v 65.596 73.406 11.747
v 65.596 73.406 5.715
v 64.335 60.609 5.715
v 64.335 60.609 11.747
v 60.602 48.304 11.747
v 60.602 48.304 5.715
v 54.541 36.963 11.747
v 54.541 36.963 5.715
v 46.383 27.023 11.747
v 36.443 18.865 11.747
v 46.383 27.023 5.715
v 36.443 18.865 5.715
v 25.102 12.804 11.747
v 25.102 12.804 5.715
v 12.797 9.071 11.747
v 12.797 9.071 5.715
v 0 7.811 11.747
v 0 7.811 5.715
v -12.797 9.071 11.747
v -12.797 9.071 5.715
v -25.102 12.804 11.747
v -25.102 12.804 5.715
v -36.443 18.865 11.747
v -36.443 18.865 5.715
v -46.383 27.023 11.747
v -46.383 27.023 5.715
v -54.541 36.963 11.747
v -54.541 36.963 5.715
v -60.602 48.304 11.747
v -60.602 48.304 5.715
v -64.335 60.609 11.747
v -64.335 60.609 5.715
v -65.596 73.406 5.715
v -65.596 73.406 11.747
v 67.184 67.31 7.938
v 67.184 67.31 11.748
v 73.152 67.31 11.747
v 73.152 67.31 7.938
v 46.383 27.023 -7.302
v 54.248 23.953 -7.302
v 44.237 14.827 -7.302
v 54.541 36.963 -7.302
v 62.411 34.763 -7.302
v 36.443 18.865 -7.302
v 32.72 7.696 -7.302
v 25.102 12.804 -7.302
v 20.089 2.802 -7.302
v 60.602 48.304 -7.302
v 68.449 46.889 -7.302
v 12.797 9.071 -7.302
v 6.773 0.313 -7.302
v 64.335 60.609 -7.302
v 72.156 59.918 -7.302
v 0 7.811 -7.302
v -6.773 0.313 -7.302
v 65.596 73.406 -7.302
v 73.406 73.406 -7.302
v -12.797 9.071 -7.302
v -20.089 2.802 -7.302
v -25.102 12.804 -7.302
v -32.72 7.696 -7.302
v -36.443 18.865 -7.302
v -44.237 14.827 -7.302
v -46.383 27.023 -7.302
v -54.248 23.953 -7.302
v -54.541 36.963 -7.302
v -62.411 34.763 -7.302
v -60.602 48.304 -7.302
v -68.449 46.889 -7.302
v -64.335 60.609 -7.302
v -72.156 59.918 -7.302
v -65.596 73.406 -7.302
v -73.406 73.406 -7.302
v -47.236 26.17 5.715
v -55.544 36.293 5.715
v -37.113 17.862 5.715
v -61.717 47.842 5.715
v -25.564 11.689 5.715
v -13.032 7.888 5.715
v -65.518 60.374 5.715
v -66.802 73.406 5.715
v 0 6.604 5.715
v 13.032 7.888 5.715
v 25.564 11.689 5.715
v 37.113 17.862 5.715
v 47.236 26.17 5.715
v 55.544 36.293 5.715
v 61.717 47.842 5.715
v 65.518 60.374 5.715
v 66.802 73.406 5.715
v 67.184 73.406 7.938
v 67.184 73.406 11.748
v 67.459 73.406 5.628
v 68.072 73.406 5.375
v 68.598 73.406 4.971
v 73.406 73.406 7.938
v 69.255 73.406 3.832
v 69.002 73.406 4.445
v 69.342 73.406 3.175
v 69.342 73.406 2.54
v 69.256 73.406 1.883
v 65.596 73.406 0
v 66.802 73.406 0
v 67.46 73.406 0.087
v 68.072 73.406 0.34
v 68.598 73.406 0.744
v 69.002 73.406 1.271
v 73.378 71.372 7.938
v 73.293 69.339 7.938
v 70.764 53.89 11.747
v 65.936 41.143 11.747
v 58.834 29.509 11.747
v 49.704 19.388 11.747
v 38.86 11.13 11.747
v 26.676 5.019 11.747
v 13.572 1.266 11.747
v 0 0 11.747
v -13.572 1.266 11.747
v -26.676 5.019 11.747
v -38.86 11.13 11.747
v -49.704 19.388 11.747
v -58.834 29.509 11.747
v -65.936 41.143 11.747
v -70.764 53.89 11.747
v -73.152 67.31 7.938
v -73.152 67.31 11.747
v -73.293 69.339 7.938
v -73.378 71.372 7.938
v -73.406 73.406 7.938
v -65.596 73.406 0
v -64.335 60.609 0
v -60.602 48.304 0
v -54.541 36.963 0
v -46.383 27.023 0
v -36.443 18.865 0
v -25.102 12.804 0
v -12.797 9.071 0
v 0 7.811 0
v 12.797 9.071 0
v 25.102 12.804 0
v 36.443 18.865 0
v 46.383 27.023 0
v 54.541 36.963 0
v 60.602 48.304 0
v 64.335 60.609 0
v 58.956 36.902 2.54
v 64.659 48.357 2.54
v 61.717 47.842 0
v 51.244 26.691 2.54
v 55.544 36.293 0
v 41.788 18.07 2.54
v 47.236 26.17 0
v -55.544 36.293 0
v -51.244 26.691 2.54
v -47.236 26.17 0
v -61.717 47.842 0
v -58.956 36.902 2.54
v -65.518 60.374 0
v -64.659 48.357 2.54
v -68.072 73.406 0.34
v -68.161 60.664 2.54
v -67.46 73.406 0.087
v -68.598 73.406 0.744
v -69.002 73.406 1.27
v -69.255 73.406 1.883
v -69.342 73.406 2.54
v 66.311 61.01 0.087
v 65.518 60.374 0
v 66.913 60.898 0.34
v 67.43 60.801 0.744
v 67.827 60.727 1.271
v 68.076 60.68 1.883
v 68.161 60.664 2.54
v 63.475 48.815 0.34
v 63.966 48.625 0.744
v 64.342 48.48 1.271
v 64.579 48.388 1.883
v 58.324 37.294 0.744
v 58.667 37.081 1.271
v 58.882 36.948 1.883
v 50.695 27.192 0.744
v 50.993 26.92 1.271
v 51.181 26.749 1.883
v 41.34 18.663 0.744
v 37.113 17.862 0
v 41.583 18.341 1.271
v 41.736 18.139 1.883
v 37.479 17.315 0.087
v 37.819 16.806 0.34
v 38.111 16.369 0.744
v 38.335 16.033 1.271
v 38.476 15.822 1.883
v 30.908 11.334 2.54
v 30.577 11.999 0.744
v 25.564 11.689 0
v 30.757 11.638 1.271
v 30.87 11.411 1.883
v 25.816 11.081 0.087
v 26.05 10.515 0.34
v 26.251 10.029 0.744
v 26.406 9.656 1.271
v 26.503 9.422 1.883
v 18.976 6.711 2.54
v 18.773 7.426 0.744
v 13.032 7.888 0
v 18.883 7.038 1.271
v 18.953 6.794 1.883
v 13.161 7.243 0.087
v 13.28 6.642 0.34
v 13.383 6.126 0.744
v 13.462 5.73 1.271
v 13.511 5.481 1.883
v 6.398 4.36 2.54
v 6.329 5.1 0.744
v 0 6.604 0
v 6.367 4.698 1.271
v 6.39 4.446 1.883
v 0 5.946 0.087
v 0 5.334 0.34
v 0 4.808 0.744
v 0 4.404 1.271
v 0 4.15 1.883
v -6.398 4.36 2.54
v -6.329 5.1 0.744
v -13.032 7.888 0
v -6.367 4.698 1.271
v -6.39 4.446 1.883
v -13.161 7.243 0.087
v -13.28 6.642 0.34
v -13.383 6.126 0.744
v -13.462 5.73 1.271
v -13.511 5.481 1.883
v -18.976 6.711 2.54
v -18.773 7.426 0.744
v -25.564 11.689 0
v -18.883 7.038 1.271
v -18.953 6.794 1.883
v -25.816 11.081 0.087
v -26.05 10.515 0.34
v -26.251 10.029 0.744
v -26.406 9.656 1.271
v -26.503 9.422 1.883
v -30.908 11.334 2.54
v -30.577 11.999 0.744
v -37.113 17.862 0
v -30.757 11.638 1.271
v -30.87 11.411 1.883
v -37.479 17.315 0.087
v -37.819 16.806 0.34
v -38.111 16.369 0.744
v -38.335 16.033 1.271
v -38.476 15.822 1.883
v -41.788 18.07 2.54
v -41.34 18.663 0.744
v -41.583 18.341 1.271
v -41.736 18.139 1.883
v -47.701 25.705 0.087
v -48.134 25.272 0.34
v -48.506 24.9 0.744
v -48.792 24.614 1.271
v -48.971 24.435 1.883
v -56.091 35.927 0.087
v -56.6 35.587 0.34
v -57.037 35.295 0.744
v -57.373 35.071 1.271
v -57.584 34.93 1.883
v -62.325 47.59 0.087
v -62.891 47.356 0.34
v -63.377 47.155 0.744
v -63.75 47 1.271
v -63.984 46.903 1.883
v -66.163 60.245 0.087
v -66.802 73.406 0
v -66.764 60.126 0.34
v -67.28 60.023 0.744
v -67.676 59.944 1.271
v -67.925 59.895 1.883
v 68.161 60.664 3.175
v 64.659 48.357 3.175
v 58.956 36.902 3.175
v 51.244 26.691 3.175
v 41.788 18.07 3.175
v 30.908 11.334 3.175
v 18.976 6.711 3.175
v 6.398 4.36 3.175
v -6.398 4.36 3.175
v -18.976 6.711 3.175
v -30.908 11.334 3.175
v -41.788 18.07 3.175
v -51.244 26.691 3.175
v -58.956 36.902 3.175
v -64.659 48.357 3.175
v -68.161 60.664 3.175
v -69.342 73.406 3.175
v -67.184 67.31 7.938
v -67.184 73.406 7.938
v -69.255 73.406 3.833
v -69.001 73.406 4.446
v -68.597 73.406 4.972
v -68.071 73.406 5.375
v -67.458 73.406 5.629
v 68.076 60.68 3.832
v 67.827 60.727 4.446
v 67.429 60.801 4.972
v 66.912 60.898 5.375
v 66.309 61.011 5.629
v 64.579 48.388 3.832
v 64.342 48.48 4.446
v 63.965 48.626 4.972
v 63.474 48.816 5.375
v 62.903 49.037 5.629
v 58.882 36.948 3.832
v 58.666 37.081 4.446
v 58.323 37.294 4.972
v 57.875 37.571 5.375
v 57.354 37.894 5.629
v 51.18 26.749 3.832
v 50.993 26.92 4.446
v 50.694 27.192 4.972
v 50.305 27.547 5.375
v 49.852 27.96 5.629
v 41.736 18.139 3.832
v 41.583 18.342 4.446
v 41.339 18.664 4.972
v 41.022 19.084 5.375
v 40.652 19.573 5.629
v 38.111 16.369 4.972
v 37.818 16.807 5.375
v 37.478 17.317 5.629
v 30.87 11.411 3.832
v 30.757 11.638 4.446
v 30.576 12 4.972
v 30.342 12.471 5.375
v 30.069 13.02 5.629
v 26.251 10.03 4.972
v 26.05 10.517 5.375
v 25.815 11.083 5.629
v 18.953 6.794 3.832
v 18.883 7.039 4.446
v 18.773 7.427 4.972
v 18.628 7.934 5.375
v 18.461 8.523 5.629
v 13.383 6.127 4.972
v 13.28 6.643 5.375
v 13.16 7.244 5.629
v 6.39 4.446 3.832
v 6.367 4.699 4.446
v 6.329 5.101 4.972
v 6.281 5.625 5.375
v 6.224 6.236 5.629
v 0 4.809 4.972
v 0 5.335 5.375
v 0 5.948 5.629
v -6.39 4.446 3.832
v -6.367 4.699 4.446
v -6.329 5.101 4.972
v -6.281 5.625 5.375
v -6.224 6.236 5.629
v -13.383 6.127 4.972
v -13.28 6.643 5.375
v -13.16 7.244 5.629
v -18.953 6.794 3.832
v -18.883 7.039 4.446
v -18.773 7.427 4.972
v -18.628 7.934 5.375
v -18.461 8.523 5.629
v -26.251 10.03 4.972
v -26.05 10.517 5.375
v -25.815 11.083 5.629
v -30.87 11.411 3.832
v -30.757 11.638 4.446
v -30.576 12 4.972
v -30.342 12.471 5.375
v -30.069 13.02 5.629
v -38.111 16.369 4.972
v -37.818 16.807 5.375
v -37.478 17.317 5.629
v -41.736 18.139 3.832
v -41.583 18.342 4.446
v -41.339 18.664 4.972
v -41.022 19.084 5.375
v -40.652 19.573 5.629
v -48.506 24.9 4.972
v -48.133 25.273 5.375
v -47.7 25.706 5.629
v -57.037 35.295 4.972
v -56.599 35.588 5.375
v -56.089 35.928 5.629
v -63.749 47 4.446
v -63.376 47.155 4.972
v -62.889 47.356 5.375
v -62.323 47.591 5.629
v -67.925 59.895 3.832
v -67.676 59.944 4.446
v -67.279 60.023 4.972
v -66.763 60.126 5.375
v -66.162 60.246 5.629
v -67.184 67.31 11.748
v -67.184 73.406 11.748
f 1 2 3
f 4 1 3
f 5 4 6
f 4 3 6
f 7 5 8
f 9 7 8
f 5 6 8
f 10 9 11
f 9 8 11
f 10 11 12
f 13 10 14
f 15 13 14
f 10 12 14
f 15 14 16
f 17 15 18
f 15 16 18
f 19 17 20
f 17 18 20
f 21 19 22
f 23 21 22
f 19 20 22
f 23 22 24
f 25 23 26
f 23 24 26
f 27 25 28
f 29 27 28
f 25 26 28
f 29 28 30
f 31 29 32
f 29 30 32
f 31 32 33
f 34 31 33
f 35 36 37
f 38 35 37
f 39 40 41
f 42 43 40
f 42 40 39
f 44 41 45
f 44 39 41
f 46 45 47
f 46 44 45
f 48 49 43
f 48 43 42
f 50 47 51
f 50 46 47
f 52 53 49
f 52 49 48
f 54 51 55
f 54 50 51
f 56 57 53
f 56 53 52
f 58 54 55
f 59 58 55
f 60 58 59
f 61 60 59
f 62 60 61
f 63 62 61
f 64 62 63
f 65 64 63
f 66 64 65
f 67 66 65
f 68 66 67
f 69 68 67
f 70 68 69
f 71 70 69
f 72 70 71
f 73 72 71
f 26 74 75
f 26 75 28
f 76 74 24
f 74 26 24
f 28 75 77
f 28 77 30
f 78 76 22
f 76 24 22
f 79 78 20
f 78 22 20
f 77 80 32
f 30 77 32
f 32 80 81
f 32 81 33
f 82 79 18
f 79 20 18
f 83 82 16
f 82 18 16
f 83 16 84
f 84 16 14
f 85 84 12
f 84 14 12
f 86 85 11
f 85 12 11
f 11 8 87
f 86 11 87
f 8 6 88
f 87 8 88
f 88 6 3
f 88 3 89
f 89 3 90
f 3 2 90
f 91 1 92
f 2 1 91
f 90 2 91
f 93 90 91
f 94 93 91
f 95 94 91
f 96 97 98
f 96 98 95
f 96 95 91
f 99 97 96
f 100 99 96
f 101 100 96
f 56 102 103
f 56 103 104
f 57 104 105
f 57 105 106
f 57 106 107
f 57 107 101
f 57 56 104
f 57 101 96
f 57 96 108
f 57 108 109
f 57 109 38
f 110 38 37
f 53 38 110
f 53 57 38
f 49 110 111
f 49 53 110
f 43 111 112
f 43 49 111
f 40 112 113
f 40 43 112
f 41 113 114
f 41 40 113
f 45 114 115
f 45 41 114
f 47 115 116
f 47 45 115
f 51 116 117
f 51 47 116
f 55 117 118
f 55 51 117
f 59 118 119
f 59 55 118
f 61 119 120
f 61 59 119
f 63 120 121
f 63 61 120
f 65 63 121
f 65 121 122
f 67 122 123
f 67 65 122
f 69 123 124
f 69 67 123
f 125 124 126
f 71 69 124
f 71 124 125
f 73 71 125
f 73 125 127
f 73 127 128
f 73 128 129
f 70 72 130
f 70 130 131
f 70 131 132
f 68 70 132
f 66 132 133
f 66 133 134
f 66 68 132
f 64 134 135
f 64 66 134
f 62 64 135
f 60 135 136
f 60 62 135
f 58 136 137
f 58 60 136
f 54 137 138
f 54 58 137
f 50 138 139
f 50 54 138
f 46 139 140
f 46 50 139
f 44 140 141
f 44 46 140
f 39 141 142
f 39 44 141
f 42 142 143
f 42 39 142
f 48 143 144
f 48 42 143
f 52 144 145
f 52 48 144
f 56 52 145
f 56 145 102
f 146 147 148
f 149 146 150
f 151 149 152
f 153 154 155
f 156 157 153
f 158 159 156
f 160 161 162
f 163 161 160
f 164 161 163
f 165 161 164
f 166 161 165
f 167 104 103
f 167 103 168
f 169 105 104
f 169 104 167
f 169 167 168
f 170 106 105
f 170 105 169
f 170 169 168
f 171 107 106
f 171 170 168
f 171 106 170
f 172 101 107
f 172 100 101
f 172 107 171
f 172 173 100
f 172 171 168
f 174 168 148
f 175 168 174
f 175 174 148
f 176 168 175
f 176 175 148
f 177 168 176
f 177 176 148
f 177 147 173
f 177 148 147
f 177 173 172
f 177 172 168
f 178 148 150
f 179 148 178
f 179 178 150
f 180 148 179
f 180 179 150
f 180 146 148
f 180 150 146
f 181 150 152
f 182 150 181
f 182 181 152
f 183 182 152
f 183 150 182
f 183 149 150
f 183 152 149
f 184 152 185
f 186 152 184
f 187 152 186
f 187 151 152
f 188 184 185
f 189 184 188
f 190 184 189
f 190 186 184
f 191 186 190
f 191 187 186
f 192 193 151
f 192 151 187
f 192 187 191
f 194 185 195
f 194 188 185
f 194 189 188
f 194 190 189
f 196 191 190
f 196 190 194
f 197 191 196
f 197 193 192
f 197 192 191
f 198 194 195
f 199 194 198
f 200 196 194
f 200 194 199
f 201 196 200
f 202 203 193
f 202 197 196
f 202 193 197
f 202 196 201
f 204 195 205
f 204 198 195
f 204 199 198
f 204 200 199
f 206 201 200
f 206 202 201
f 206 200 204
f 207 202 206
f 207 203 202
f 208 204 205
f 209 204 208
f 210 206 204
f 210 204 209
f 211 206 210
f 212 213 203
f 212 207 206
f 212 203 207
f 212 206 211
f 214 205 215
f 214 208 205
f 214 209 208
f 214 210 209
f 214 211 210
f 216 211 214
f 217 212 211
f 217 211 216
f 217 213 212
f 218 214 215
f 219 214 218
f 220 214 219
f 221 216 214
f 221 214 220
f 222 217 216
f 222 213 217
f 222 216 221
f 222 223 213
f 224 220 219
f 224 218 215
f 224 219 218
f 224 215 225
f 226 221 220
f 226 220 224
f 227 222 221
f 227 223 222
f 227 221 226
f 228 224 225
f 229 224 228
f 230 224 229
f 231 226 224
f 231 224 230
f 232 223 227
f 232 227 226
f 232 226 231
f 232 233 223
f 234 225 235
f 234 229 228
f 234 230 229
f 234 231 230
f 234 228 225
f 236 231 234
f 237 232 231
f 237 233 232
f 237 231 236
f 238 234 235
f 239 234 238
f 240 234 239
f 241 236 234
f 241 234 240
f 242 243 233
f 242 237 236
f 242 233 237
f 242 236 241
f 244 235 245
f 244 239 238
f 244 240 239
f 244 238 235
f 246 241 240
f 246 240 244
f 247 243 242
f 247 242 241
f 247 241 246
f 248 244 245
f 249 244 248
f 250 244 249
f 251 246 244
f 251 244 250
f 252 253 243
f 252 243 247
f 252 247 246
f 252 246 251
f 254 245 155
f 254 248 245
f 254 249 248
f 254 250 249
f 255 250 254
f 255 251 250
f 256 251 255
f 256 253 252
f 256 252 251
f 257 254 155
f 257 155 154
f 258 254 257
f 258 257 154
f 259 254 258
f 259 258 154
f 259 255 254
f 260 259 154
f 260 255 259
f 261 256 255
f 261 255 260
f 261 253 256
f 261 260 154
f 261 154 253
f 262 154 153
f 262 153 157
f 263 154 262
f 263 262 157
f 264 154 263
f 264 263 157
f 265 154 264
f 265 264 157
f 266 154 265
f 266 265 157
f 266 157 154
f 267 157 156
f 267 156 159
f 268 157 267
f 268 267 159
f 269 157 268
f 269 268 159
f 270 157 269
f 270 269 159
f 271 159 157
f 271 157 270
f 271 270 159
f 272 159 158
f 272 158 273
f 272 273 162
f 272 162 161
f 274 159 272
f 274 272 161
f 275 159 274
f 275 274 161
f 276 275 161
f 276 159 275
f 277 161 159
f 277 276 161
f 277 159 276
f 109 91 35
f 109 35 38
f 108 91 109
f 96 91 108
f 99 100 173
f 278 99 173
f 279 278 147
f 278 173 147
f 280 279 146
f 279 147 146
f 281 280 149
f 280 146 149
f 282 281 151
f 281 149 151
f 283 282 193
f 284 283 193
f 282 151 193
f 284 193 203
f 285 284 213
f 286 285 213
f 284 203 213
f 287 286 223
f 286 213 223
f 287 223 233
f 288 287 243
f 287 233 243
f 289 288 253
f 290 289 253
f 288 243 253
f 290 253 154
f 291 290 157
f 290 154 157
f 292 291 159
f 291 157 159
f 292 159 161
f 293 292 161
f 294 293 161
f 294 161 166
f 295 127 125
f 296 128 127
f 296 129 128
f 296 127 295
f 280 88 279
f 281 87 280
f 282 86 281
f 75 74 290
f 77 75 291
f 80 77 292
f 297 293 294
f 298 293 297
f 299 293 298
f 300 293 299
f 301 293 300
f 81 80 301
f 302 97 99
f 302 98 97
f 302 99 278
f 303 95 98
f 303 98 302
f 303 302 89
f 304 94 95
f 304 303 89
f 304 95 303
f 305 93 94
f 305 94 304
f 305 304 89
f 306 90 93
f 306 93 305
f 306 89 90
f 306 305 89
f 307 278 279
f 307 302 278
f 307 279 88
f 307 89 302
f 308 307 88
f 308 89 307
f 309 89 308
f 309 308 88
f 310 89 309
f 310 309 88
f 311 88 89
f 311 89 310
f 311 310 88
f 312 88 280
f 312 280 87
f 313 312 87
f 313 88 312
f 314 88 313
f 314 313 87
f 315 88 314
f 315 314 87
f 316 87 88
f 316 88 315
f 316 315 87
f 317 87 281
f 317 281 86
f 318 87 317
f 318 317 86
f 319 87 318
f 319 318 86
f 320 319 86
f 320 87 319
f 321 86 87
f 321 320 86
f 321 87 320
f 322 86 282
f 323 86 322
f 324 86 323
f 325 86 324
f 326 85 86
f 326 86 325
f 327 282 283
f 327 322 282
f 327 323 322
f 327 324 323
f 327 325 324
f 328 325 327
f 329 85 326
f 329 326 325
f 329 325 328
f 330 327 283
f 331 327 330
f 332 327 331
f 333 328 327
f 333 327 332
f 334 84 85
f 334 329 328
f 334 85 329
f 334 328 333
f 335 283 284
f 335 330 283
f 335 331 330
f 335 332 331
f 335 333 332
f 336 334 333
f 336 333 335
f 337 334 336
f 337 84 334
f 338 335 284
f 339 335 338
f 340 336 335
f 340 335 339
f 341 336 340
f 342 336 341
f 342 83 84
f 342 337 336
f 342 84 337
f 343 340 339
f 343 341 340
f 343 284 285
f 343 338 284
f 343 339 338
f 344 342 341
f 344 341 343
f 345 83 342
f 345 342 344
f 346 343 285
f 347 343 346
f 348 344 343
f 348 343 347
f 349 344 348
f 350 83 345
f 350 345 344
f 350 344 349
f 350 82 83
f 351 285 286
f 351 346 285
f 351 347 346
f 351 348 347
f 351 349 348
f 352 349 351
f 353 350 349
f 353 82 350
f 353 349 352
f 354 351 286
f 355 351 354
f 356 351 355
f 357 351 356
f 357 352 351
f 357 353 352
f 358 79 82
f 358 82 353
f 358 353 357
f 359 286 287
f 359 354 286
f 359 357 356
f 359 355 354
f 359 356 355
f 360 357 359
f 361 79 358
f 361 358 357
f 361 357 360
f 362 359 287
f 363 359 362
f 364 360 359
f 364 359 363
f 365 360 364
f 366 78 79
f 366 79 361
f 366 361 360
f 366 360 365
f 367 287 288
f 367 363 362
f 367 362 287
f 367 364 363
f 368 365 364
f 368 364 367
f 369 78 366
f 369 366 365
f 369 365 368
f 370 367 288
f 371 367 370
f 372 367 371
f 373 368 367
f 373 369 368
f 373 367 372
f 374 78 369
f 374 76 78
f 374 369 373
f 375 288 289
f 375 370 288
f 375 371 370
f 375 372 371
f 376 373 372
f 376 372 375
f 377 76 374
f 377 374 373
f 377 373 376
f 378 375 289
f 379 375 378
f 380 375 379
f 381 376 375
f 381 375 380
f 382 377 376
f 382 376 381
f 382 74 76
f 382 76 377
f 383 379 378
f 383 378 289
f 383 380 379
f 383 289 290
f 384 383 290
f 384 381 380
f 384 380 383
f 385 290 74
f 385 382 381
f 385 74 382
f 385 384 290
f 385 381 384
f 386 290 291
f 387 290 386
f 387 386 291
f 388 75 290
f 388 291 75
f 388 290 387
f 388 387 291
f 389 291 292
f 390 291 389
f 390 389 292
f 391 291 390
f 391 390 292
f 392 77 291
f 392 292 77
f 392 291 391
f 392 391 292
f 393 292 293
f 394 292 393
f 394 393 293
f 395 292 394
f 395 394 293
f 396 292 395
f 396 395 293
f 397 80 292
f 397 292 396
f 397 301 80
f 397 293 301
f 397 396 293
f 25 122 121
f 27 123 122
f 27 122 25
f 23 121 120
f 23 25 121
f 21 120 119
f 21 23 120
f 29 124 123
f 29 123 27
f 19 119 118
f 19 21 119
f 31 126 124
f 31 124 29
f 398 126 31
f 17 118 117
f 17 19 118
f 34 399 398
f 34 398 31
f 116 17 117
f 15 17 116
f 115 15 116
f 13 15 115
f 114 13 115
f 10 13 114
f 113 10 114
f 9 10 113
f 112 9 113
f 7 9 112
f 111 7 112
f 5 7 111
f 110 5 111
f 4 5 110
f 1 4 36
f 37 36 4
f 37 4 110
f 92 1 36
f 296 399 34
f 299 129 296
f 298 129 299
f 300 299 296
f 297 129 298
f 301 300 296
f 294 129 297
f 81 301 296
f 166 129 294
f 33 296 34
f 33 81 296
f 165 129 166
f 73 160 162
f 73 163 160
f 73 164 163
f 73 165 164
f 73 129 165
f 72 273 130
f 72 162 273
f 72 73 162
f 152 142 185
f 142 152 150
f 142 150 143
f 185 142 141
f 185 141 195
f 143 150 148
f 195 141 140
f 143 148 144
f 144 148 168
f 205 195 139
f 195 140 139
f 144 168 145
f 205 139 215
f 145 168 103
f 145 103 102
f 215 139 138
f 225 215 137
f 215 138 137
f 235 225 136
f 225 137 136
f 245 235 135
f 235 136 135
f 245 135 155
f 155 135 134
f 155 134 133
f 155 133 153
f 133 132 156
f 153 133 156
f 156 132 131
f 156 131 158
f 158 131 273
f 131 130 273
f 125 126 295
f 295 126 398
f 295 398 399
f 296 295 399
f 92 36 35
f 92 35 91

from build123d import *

# Parameters (mm, degrees)
BOSS_EXTRUDE1_DEPTH = 5.715
BOSS_EXTRUDE2_DEPTH = 6.0325
BOSS_EXTRUDE3_START = 7.3025
BOSS_EXTRUDE3_DEPTH = 7.3025
FILLET1_R           = 2.54
SKETCH6_W           = 6.645493415
SKETCH6_H           = 6.096
CUT_EXTRUDE5_DEPTH  = 3.81


with BuildPart() as part:
    # Sketch1 → Boss-Extrude1 (new body)
    with BuildSketch(Plane.XY):
        with BuildLine():
            ThreePointArc((69.342, 73.406), (0, 4.064), (-69.342, 73.406))
            Line((-69.342, 73.406), (-73.406, 73.406))
            ThreePointArc((-73.406, 73.406), (0, 0), (73.406, 73.406))
            Line((73.406, 73.406), (69.342, 73.406))
        make_face()
    extrude(amount=BOSS_EXTRUDE1_DEPTH)

    # Sketch3 → Boss-Extrude2 (add)
    with BuildSketch(Plane.XY.offset(5.715)):
        with BuildLine():
            ThreePointArc((65.5955, 73.406), (0, 7.8105), (-65.5955, 73.406))
            Line((-65.5955, 73.406), (-69.342, 73.406))
            ThreePointArc((-69.342, 73.406), (0, 4.064), (69.342, 73.406))
            Line((69.342, 73.406), (65.5955, 73.406))
        make_face()
        with BuildLine():
            Line((73.406, 73.406), (69.342, 73.406))
            ThreePointArc((69.342, 73.406), (0, 4.064), (-69.342, 73.406))
            Line((-69.342, 73.406), (-73.406, 73.406))
            ThreePointArc((-73.406, 73.406), (0, 0), (73.406, 73.406))
        make_face()
    extrude(amount=BOSS_EXTRUDE2_DEPTH)

    # Sketch4 → Boss-Extrude3 (add)
    with BuildSketch(Plane(origin=(0, 0, 0), x_dir=(-1, 0, 0), z_dir=(0, 0, -1)).offset(BOSS_EXTRUDE3_START)):
        with BuildLine():
            ThreePointArc((65.5955, 73.406), (0, 7.8105), (-65.5955, 73.406))
            Line((-65.5955, 73.406), (-69.342, 73.406))
            ThreePointArc((-69.342, 73.406), (0, 4.064), (69.342, 73.406))
            Line((69.342, 73.406), (65.5955, 73.406))
        make_face()
        with BuildLine():
            Line((73.406, 73.406), (69.342, 73.406))
            ThreePointArc((69.342, 73.406), (0, 4.064), (-69.342, 73.406))
            Line((-69.342, 73.406), (-73.406, 73.406))
            ThreePointArc((-73.406, 73.406), (0, 0), (73.406, 73.406))
        make_face()
    extrude(amount=-BOSS_EXTRUDE3_DEPTH)

    # Fillet1
    fillet1_edges = [part.edges().sort_by_distance(p)[0] for p in [
        (0, 4.064, 5.715),
        (0, 4.064, 0),
    ]]
    fillet(fillet1_edges, radius=FILLET1_R)

    # Sketch6 → Cut-Extrude5 (cut)
    with BuildSketch(Plane.XY.offset(11.7475)):
        with Locations((-70.506627119, 70.358)):
            Rectangle(SKETCH6_W, SKETCH6_H)
        with Locations((70.506627119, 70.358)):
            Rectangle(SKETCH6_W, SKETCH6_H)
    extrude(amount=-CUT_EXTRUDE5_DEPTH, mode=Mode.SUBTRACT)


solid = part.part
